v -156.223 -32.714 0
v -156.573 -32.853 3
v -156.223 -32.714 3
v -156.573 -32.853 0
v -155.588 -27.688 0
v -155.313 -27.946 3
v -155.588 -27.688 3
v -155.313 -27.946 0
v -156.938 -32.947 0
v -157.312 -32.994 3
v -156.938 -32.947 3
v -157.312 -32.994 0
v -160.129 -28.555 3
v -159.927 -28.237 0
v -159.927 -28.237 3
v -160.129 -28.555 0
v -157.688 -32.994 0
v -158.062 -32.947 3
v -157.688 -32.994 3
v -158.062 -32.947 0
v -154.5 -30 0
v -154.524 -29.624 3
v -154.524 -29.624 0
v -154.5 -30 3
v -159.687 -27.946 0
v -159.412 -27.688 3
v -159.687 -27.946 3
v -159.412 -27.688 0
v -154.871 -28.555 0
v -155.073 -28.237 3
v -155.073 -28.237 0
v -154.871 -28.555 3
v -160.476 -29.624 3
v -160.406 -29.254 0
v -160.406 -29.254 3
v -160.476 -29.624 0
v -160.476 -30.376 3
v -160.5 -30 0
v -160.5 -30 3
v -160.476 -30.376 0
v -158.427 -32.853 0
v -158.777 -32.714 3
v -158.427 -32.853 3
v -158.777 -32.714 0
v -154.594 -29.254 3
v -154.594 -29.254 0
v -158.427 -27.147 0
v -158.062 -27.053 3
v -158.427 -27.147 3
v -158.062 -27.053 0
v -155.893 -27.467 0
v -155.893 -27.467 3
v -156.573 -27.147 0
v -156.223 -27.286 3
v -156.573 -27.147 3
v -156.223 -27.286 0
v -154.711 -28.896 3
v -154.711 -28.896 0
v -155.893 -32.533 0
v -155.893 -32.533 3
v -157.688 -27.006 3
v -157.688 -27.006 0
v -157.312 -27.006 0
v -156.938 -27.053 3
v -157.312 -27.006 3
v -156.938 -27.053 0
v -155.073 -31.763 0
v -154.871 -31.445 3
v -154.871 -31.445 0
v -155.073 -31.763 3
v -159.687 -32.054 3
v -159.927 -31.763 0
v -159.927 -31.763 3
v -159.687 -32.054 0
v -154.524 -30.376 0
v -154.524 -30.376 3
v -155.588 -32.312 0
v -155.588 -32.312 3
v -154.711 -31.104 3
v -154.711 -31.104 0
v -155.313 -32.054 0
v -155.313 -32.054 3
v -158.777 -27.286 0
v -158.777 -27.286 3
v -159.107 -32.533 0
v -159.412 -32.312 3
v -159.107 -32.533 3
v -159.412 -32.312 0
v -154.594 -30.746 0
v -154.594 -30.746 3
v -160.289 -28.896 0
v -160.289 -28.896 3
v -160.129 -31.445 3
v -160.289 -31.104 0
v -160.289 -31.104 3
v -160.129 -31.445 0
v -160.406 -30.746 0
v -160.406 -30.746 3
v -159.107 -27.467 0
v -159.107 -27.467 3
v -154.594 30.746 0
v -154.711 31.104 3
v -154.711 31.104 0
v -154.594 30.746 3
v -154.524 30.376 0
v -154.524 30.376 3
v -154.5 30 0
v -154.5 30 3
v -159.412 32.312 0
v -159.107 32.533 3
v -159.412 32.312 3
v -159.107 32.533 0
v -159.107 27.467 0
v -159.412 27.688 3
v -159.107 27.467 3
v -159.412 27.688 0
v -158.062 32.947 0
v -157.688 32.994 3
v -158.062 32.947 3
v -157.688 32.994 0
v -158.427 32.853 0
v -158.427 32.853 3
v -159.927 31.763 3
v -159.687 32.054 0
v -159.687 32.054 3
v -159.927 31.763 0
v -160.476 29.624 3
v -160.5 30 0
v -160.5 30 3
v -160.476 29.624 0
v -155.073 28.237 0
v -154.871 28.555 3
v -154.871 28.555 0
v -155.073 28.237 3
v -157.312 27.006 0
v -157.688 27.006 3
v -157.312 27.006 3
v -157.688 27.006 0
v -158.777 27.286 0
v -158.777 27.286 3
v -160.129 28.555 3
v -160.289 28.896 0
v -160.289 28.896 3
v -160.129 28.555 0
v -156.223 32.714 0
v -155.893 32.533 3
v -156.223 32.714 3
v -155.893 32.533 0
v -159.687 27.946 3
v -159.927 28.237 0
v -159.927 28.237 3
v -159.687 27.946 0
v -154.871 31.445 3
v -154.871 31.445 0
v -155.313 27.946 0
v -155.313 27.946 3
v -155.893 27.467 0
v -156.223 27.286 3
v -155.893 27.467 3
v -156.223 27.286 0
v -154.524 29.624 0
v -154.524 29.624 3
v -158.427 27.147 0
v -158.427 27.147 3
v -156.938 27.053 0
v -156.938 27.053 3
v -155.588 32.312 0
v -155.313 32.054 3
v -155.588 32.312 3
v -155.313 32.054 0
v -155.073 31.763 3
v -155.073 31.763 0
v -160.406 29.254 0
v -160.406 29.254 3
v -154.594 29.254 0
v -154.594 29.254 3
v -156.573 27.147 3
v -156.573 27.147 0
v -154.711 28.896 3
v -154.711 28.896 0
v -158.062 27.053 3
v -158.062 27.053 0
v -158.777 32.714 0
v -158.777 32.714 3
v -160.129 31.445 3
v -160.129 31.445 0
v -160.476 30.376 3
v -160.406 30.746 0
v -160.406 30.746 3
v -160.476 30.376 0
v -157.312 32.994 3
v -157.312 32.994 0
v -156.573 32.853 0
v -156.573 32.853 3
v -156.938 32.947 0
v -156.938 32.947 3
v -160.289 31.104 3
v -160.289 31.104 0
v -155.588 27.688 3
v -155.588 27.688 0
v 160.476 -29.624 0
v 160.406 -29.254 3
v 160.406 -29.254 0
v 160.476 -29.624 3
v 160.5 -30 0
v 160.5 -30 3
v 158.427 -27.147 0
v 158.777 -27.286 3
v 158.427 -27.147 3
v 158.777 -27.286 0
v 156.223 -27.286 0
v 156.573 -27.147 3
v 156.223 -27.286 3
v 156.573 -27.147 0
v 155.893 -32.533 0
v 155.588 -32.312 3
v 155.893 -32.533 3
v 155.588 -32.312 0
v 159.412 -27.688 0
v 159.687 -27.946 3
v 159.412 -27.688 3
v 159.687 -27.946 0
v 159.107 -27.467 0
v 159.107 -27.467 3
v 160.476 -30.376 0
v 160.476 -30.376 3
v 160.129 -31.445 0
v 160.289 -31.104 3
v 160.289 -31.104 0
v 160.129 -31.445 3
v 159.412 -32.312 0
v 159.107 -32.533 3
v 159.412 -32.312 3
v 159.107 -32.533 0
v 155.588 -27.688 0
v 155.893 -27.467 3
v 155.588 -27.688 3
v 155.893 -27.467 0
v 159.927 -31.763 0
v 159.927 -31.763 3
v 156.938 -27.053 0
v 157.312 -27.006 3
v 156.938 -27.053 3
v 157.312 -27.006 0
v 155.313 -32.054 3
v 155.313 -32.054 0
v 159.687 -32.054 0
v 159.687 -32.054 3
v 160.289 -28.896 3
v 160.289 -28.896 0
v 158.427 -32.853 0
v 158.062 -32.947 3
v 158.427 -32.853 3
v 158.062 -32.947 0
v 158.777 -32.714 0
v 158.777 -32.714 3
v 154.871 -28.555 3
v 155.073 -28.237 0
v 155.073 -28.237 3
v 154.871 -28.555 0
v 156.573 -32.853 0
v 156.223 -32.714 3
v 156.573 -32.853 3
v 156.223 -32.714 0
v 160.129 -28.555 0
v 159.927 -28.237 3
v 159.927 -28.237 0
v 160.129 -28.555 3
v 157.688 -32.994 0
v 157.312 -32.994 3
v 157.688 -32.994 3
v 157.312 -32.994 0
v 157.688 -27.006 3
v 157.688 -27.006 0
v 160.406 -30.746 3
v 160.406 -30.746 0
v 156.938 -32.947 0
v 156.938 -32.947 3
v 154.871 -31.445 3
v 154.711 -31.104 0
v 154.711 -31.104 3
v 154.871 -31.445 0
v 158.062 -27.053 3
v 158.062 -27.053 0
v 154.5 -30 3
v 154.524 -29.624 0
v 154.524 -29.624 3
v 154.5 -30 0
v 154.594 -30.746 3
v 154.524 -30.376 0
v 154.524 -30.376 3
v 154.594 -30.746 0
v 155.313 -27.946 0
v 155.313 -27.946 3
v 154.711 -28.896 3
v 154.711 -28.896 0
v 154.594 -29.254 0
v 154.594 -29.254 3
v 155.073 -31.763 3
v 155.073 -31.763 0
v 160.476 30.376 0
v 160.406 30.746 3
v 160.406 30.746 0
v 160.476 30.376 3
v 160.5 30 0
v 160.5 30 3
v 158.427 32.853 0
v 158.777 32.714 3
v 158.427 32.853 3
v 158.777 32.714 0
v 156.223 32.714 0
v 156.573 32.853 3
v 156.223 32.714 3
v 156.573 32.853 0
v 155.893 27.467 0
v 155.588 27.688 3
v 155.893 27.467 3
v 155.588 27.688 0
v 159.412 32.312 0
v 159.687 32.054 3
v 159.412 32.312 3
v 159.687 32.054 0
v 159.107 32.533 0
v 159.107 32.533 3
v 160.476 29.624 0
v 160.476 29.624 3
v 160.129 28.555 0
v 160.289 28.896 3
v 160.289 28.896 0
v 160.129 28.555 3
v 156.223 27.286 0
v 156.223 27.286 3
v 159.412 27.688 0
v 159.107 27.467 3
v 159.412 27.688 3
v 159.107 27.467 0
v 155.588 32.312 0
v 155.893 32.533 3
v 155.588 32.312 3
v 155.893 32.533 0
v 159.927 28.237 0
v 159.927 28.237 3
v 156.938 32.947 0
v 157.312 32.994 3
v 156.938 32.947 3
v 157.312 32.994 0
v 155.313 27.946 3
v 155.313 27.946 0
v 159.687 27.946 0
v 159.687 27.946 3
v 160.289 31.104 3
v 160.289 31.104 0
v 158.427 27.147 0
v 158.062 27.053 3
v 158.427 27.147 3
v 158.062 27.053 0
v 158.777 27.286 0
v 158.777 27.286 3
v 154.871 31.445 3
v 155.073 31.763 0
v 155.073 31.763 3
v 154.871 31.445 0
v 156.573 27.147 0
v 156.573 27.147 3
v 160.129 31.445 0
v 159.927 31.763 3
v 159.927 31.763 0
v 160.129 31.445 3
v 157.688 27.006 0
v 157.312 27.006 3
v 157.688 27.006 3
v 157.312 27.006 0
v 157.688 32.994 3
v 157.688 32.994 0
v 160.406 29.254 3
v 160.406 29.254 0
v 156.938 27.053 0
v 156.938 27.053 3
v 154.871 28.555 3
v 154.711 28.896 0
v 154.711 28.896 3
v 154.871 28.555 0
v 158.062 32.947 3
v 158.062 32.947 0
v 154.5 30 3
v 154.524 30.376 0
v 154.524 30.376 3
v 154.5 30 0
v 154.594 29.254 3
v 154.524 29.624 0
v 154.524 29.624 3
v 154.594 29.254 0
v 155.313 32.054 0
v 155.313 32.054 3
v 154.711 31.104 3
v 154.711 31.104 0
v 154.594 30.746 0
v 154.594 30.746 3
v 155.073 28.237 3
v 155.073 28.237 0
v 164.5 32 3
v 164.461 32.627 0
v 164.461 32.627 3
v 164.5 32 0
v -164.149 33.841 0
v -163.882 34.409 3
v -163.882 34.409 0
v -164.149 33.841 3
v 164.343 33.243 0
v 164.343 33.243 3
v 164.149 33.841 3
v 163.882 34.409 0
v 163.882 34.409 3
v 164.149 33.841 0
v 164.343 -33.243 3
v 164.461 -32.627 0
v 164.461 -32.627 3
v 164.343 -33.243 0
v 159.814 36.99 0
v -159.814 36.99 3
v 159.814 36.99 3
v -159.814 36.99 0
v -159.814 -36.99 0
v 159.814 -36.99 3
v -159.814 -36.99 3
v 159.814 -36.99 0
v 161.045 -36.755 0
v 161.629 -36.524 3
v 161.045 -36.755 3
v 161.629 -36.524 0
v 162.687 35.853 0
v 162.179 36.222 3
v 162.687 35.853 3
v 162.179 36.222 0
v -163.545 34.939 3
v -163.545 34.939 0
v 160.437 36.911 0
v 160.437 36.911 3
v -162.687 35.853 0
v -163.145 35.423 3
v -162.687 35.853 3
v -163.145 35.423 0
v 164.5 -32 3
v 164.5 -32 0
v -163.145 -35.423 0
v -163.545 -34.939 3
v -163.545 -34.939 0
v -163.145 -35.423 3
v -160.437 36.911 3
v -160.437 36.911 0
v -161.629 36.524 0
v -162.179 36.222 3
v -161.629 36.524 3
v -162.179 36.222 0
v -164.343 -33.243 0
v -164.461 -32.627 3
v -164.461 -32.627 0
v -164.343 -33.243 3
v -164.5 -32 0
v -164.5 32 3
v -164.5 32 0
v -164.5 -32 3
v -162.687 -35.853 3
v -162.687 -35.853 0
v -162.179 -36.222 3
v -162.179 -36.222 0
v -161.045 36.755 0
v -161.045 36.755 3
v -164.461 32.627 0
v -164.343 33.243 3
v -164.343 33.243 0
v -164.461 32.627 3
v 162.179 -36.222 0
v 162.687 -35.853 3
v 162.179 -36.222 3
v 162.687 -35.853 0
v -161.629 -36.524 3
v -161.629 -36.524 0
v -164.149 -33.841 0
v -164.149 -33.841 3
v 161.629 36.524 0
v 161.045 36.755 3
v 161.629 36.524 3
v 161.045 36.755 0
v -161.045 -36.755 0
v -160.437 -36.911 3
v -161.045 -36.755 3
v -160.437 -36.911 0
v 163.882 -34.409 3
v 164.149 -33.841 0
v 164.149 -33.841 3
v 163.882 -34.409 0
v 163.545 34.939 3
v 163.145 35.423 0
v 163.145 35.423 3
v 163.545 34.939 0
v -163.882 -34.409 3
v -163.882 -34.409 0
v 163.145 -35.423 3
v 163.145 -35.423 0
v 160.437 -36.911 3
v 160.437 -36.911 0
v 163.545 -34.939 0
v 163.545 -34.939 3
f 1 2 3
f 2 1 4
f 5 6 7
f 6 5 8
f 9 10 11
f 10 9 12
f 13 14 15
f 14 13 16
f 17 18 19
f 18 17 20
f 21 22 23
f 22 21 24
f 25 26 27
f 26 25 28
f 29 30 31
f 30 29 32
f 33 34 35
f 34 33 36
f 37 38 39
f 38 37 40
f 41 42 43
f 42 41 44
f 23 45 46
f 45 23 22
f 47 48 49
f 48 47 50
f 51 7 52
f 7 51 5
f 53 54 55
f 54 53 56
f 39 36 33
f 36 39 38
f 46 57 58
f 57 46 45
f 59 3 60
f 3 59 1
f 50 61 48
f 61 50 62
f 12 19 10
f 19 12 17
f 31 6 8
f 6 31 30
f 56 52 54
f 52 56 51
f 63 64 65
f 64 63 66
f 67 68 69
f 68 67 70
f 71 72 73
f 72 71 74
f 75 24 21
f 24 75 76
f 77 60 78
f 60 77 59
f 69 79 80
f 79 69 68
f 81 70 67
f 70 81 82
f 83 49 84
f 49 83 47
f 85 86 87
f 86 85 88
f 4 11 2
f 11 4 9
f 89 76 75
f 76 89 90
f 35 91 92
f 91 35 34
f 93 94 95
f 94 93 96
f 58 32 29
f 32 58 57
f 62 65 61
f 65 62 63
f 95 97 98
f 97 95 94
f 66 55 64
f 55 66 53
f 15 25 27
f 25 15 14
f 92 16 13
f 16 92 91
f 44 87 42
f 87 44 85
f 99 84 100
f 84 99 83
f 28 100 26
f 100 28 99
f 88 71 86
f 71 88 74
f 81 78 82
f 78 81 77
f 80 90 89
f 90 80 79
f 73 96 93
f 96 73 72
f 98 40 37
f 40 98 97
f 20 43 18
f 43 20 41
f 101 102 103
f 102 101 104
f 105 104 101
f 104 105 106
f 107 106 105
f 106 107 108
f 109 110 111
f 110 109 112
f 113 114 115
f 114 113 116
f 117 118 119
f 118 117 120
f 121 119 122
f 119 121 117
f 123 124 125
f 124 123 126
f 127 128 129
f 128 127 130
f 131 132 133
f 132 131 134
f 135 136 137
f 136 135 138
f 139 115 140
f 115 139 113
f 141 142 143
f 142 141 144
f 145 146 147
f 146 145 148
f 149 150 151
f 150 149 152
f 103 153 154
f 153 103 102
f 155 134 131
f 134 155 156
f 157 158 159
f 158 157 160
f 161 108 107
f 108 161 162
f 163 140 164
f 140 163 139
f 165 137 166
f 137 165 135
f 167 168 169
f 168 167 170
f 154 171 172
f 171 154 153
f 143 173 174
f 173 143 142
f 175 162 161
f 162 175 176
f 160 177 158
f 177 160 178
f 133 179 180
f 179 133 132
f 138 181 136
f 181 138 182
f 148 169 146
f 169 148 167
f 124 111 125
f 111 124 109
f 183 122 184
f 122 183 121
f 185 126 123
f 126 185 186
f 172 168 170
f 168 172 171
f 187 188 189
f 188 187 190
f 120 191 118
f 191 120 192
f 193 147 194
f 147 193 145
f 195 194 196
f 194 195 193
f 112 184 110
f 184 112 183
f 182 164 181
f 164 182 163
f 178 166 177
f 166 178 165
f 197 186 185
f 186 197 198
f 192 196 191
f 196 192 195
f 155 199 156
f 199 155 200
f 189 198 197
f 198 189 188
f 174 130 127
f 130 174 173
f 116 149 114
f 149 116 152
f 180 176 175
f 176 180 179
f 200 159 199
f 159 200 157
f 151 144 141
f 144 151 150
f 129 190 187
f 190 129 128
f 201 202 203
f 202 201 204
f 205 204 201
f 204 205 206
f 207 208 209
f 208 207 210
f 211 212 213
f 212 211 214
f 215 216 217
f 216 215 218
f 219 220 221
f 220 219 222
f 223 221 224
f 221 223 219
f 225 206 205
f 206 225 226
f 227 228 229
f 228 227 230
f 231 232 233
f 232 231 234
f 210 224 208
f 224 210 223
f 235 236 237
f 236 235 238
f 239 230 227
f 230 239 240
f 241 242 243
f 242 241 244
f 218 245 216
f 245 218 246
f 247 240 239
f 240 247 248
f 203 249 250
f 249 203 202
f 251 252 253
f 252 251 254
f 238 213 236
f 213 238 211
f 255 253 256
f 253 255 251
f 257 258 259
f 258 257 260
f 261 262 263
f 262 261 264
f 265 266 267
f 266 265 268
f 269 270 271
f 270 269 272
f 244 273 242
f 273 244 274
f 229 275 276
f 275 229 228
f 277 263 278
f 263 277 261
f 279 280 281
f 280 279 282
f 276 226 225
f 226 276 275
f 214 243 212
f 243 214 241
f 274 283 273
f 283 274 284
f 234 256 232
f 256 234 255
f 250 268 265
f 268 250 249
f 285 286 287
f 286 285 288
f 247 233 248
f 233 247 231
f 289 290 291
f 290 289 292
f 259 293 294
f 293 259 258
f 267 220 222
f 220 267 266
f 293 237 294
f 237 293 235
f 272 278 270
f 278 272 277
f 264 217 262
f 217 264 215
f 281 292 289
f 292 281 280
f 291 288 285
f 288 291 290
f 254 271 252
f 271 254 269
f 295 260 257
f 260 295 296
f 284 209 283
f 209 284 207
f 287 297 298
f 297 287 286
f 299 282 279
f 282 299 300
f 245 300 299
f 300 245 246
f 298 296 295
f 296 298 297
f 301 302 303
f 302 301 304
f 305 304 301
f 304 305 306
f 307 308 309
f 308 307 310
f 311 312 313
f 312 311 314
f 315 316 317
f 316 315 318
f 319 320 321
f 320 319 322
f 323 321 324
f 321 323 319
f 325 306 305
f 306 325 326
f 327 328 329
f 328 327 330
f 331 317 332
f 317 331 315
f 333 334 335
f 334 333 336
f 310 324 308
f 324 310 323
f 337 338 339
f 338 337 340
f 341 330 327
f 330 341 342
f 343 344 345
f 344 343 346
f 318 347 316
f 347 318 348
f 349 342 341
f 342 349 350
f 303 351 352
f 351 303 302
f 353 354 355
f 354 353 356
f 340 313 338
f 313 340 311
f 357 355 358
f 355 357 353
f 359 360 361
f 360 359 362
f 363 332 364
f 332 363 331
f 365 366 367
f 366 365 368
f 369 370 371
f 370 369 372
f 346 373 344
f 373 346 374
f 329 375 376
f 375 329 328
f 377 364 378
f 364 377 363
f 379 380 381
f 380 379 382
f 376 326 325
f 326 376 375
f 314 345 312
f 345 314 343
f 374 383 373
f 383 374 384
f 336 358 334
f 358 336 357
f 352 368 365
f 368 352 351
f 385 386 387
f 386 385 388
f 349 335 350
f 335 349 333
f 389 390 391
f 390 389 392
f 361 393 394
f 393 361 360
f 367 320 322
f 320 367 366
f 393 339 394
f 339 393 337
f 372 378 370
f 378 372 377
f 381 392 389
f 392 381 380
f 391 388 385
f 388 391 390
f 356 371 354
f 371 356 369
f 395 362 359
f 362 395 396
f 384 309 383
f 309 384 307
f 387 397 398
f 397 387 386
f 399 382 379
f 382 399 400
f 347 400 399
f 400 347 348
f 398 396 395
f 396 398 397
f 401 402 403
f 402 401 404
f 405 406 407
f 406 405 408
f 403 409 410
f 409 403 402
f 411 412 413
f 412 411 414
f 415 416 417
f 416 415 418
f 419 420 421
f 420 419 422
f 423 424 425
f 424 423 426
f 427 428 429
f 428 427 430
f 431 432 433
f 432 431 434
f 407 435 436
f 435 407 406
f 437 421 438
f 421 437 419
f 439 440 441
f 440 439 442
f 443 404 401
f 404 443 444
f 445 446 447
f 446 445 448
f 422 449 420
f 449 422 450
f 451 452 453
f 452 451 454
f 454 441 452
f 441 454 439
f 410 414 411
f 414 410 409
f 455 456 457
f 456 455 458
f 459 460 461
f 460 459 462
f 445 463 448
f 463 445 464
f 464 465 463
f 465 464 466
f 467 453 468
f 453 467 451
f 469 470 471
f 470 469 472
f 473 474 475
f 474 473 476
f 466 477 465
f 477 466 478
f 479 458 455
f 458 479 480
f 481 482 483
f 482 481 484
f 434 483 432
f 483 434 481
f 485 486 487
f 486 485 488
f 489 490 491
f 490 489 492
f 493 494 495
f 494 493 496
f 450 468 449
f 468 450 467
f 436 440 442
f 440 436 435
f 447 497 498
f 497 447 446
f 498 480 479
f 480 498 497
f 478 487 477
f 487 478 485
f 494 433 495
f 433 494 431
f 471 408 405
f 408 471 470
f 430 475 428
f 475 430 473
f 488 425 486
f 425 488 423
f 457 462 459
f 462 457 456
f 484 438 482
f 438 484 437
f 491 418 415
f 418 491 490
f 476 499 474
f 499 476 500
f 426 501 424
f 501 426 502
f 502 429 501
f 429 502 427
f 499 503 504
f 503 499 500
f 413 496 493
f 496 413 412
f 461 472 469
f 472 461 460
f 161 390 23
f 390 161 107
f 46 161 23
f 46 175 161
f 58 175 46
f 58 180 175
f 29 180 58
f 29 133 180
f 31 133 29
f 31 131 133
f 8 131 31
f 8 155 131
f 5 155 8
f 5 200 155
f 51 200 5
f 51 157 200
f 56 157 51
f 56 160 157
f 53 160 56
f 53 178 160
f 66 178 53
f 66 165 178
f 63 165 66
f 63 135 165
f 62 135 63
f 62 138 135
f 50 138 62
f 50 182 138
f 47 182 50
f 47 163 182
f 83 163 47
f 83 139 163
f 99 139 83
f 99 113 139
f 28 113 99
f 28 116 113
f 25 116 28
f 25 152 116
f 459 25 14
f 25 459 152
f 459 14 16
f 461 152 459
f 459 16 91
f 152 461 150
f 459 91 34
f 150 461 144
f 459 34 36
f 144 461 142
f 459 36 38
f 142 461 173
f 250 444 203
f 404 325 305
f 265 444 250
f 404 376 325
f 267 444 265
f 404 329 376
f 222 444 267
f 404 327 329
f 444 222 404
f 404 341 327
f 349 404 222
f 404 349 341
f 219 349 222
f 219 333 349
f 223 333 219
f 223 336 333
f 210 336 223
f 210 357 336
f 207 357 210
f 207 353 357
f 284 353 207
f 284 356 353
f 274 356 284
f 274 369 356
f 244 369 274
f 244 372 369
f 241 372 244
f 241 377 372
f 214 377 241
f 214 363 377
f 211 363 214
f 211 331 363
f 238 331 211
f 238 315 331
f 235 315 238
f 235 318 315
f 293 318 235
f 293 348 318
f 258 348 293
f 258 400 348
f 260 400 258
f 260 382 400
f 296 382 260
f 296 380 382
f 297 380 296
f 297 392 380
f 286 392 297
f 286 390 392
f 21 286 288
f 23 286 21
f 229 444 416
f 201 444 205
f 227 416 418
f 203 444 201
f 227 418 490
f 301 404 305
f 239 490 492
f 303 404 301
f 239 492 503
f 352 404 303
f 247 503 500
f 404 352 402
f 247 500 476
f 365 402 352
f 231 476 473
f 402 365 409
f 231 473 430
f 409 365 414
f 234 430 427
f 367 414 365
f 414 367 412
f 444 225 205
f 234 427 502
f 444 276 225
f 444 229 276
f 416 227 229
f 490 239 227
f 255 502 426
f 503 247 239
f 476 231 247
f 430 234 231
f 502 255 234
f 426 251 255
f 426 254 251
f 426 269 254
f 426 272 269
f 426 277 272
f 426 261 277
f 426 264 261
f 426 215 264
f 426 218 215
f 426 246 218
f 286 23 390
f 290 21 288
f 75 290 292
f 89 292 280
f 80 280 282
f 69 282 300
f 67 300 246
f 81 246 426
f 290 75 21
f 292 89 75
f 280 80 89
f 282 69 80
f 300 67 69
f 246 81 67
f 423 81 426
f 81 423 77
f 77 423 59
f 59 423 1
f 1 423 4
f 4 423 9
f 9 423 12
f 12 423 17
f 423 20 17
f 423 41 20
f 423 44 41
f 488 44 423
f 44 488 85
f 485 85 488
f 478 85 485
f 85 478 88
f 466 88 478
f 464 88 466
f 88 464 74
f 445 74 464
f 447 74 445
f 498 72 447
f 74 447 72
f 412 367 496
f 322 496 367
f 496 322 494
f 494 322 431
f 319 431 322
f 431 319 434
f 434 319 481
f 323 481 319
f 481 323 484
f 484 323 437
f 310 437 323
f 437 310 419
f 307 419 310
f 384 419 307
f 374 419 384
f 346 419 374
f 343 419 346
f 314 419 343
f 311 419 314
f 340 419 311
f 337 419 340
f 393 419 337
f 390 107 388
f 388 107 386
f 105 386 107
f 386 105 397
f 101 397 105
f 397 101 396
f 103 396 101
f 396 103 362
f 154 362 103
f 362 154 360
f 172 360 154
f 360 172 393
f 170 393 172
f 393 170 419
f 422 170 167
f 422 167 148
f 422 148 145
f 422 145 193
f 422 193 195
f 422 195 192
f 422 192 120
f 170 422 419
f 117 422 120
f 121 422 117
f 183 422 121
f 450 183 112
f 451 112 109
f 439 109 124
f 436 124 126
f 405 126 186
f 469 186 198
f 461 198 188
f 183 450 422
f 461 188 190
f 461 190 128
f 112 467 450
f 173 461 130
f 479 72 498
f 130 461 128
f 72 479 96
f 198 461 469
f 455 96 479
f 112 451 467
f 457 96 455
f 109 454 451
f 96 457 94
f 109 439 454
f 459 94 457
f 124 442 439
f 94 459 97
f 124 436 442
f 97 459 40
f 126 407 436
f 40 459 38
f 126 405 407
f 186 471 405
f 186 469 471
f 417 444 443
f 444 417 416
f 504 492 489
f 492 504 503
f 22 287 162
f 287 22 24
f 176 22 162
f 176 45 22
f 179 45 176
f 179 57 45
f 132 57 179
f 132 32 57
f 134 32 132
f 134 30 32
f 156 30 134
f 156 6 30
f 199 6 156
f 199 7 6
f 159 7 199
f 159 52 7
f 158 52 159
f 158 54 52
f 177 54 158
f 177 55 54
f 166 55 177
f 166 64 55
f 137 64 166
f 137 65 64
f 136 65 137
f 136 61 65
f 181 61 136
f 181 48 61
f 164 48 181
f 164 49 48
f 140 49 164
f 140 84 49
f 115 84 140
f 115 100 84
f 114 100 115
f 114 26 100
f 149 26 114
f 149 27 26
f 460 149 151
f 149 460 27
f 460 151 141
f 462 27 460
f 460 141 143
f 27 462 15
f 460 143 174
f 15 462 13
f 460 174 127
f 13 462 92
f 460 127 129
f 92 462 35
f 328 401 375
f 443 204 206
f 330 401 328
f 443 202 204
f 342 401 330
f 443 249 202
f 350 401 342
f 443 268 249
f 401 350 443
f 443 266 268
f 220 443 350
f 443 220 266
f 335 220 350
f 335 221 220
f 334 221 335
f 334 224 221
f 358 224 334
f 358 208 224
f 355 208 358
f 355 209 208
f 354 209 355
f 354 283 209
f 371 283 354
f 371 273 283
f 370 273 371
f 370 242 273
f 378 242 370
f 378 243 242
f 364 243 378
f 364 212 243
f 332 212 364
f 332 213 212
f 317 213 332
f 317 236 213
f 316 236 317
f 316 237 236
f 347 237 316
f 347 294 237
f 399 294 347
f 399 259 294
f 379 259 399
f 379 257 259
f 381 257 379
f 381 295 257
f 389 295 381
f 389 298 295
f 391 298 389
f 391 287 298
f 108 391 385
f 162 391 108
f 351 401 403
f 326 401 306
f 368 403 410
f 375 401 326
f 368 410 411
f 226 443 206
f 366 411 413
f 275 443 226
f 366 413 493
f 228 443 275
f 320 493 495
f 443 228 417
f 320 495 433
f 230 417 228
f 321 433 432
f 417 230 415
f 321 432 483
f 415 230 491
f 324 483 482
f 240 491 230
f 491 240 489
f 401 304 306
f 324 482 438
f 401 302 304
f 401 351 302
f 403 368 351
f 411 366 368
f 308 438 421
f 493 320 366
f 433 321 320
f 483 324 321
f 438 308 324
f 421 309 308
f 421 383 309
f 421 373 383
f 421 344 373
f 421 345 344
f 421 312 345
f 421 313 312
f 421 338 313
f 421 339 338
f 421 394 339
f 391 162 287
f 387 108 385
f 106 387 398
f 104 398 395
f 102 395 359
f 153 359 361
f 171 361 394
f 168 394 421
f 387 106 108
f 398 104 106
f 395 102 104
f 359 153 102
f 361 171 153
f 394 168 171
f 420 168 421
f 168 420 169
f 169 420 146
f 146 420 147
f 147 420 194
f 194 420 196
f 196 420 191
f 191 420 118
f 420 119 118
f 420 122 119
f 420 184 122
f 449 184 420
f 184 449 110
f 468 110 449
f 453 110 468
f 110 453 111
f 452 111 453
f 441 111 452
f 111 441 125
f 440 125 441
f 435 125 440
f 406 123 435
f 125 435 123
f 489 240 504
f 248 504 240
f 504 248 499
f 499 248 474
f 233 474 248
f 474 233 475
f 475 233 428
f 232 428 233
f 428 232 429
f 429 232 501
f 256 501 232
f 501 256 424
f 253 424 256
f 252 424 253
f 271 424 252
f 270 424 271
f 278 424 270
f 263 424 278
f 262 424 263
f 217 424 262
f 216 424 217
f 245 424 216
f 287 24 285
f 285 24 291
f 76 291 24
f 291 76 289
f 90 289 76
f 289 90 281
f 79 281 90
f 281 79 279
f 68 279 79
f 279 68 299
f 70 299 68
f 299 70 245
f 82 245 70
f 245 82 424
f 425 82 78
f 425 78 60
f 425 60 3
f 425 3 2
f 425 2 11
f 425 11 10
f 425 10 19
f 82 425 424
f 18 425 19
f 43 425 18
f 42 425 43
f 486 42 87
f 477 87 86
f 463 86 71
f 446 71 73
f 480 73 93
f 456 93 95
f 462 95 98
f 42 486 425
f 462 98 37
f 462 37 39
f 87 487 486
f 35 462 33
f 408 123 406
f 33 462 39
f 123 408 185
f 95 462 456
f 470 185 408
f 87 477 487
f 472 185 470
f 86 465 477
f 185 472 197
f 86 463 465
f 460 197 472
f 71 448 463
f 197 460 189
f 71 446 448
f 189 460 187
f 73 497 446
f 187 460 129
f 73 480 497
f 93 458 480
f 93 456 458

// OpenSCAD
$fn = 50;


difference() {
	union() {
		hull() {
			translate(v = [-159.5000000000, 32.0000000000, 0]) {
				cylinder(h = 3, r = 5);
			}
			translate(v = [159.5000000000, 32.0000000000, 0]) {
				cylinder(h = 3, r = 5);
			}
			translate(v = [-159.5000000000, -32.0000000000, 0]) {
				cylinder(h = 3, r = 5);
			}
			translate(v = [159.5000000000, -32.0000000000, 0]) {
				cylinder(h = 3, r = 5);
			}
		}
	}
	union() {
		translate(v = [-157.5000000000, -30.0000000000, -100.0000000000]) {
			cylinder(h = 200, r = 3.0000000000);
		}
		translate(v = [-157.5000000000, 30.0000000000, -100.0000000000]) {
			cylinder(h = 200, r = 3.0000000000);
		}
		translate(v = [157.5000000000, -30.0000000000, -100.0000000000]) {
			cylinder(h = 200, r = 3.0000000000);
		}
		translate(v = [157.5000000000, 30.0000000000, -100.0000000000]) {
			cylinder(h = 200, r = 3.0000000000);
		}
	}
}
